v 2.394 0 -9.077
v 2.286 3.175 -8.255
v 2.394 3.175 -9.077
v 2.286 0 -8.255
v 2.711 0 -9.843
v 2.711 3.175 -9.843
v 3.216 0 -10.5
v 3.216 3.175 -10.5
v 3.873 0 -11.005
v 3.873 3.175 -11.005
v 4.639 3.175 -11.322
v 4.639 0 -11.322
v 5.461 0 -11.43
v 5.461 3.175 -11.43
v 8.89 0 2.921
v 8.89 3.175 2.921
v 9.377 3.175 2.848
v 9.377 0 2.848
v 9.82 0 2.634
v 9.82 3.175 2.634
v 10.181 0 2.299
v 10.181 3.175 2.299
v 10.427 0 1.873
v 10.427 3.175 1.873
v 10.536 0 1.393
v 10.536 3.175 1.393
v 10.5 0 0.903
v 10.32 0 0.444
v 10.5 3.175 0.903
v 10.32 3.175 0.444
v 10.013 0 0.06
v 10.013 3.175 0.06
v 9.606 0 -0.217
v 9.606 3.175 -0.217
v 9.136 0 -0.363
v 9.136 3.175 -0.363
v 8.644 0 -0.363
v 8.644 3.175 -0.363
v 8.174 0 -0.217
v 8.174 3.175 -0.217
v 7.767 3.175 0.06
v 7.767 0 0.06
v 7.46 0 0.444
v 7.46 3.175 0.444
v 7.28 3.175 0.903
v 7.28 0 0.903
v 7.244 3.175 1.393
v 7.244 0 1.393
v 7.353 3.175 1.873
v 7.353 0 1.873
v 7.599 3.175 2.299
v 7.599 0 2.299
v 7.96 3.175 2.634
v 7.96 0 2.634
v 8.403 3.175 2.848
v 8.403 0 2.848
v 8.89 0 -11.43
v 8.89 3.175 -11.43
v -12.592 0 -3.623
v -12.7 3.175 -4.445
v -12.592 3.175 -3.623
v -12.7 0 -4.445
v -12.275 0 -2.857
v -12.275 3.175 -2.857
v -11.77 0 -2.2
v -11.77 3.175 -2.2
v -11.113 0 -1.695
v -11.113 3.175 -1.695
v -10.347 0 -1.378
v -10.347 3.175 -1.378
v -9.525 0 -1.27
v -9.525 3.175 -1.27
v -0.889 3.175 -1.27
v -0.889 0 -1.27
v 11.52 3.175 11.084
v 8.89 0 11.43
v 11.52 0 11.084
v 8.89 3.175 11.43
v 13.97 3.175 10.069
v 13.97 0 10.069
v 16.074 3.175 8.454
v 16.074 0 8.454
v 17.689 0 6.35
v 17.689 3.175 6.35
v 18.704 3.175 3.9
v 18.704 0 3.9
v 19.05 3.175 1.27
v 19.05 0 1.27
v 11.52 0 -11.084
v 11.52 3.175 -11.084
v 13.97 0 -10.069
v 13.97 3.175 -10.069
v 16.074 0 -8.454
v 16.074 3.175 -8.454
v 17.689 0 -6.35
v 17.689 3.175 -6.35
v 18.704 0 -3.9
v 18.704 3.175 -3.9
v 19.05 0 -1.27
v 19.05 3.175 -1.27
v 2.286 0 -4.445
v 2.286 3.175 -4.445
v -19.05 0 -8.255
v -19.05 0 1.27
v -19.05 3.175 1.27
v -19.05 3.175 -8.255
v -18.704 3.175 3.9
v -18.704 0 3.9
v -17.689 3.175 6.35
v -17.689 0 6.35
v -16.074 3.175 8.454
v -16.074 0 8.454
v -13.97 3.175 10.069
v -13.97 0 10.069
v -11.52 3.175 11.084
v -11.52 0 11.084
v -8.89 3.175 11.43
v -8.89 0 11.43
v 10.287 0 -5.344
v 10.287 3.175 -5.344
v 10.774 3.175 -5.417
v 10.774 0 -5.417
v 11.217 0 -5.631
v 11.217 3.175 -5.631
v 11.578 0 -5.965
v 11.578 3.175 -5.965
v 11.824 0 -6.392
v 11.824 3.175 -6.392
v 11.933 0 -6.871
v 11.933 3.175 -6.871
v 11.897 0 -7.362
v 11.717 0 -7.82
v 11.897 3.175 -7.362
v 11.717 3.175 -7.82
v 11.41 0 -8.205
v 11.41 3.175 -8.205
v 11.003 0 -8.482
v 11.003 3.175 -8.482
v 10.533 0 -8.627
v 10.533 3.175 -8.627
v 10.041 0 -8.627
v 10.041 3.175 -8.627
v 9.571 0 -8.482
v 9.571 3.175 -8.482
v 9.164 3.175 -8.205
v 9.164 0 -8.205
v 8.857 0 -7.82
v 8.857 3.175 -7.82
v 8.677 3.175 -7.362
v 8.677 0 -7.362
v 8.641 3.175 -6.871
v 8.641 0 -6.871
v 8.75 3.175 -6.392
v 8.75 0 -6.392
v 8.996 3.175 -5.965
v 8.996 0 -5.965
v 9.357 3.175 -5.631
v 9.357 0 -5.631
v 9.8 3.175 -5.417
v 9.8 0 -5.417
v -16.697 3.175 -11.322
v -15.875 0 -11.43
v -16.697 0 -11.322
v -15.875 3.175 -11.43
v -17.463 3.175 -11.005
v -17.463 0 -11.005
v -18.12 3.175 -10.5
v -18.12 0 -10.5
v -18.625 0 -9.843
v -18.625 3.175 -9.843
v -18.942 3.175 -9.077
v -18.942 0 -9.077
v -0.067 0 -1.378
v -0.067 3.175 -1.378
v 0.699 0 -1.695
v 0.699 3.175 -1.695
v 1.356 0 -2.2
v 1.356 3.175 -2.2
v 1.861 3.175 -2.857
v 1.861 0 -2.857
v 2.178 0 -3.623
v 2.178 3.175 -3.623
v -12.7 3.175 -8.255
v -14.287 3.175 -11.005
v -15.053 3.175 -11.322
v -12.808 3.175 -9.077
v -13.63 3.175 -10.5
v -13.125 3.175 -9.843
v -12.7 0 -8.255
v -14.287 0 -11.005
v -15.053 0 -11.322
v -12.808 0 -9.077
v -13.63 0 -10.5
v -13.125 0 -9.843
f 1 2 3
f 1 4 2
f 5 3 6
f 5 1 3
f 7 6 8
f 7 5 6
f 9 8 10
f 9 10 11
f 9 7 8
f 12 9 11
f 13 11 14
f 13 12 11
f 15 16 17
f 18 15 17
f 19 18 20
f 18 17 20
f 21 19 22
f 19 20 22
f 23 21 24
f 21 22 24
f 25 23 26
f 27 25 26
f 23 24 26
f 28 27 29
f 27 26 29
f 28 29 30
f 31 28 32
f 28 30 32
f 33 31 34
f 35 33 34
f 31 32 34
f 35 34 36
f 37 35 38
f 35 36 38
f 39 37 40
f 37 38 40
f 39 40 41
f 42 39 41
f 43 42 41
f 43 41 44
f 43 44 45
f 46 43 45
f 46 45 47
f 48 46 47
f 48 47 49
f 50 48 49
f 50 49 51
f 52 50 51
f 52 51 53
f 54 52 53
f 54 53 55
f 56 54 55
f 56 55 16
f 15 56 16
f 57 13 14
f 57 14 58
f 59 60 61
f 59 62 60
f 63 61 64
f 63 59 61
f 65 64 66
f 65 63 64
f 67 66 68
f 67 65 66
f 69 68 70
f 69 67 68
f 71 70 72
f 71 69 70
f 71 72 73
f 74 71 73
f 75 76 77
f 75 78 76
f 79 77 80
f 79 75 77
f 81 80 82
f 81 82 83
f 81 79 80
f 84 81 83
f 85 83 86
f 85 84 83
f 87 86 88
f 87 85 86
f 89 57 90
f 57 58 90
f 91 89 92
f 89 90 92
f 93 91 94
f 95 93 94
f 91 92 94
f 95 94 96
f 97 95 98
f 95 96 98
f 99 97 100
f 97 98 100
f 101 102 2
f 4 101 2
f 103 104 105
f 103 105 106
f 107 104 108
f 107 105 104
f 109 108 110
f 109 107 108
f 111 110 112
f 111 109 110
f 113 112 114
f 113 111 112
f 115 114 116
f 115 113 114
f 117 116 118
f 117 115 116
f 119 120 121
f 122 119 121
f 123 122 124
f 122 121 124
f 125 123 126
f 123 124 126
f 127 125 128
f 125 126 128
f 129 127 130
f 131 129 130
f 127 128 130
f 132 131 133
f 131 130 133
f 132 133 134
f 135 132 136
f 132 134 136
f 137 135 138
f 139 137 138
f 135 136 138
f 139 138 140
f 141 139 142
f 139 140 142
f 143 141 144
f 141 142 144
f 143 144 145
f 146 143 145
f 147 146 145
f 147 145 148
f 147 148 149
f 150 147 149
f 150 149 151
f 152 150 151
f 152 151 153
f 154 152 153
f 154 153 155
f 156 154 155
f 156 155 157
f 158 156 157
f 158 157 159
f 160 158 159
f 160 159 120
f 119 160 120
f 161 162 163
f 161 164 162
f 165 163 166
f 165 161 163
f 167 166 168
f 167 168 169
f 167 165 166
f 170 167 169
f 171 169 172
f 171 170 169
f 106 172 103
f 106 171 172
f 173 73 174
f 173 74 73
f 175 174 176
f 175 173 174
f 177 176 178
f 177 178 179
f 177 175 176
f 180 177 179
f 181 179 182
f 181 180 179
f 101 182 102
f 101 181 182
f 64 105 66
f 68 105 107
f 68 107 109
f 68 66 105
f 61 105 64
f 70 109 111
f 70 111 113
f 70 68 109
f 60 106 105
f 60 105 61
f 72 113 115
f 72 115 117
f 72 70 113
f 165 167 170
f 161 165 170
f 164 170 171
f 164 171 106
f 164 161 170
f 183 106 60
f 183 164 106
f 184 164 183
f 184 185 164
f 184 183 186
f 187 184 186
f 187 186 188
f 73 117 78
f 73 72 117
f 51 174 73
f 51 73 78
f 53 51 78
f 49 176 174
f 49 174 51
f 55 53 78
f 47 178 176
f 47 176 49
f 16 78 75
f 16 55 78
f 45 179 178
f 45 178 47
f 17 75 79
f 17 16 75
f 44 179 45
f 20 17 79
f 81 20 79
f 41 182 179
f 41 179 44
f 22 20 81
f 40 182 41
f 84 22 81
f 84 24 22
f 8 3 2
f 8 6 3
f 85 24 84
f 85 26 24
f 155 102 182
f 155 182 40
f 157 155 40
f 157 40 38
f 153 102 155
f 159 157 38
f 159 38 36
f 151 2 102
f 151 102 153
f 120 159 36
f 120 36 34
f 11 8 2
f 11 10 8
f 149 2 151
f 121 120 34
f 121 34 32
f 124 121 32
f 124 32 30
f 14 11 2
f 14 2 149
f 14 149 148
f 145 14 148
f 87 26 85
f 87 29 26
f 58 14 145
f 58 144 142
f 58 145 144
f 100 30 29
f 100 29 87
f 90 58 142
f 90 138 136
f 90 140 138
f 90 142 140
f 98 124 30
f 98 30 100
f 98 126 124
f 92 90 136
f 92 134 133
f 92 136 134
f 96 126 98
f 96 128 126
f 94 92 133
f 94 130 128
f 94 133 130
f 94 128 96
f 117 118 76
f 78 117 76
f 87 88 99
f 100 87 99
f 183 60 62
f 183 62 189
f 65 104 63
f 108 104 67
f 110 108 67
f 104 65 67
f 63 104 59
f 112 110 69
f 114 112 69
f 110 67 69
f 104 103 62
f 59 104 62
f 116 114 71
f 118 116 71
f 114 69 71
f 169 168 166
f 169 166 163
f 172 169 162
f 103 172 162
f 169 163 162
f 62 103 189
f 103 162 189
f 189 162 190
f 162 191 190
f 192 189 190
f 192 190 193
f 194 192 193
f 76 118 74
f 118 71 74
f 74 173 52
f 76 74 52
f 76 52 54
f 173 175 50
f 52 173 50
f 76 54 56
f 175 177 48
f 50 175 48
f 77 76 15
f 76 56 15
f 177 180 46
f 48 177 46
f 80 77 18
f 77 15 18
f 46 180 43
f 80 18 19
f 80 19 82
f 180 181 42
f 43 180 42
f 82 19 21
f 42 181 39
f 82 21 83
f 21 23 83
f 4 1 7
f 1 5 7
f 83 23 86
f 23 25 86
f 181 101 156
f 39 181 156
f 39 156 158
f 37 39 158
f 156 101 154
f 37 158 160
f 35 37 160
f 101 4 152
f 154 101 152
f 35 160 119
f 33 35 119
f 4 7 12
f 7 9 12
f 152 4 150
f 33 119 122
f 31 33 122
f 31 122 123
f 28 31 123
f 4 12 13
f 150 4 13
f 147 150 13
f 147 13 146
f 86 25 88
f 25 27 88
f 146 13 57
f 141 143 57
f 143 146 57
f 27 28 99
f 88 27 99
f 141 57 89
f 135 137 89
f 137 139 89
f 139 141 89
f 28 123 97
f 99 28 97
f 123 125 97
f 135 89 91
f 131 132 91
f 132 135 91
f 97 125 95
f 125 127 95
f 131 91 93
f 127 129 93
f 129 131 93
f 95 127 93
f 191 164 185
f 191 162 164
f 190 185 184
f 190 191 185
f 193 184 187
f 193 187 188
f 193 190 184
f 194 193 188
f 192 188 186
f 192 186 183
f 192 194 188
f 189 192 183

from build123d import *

# Parameters (mm, degrees)
SKETCH1_W           = 38.1
SKETCH1_H           = 22.86
BOSS_EXTRUDE1_DEPTH = 3.175
FILLET1_R           = 10.16
SKETCH3_R           = 1.651
CUT_EXTRUDE1_DEPTH  = 23.44165825
FILLET3_R           = 10.16
SKETCH4_W           = 14.986
SKETCH4_H           = 10.16
CUT_EXTRUDE3_DEPTH  = 23.44165825
FILLET8_R           = 3.175


with BuildPart() as part:
    # Sketch1 → Boss-Extrude1 (new body)
    with BuildSketch(Plane(origin=(0, 0, 0), x_dir=(1, 0, 0), z_dir=(0, 1, 0))):
        Rectangle(SKETCH1_W, SKETCH1_H)
    extrude(amount=BOSS_EXTRUDE1_DEPTH)

    # Fillet1
    fillet1_edges = [part.edges().sort_by_distance(p)[0] for p in [
        (19.05, 1.5875, 11.43),
        (-19.05, 1.5875, 11.43),
    ]]
    fillet(fillet1_edges, radius=FILLET1_R)

    # Sketch3 → Cut-Extrude1 (cut, through all)
    with BuildSketch(Plane(origin=(0, 3.175, 0), x_dir=(1, 0, 0), z_dir=(0, 1, 0))):
        with Locations(Location((8.89, -1.27, 0), (0, 0, 270))):
            Circle(SKETCH3_R)
        with Locations(Location((10.287, 6.994763457, 0), (0, 0, 270))):
            Circle(SKETCH3_R)
    extrude(amount=-CUT_EXTRUDE1_DEPTH, mode=Mode.SUBTRACT)

    # Fillet3
    fillet3_edges = [part.edges().sort_by_distance(p)[0] for p in [
        (19.05, 1.5875, -11.43),
    ]]
    fillet(fillet3_edges, radius=FILLET3_R)

    # Sketch4 → Cut-Extrude3 (cut, through all)
    with BuildSketch(Plane(origin=(0, 3.175, 0), x_dir=(1, 0, 0), z_dir=(0, 1, 0))):
        with Locations((-5.207, 6.35)):
            Rectangle(SKETCH4_W, SKETCH4_H)
    extrude(amount=-CUT_EXTRUDE3_DEPTH, mode=Mode.SUBTRACT)

    # Fillet8
    fillet8_edges = [part.edges().sort_by_distance(p)[0] for p in [
        (-12.7, 1.5875, -1.27),
        (-12.7, 1.5875, -11.43),
        (2.286, 1.5875, -11.43),
        (2.286, 1.5875, -1.27),
        (-19.05, 1.5875, -11.43),
    ]]
    fillet(fillet8_edges, radius=FILLET8_R - 0.0001)  # a hair under: the kernel refuses the full size


solid = part.part
